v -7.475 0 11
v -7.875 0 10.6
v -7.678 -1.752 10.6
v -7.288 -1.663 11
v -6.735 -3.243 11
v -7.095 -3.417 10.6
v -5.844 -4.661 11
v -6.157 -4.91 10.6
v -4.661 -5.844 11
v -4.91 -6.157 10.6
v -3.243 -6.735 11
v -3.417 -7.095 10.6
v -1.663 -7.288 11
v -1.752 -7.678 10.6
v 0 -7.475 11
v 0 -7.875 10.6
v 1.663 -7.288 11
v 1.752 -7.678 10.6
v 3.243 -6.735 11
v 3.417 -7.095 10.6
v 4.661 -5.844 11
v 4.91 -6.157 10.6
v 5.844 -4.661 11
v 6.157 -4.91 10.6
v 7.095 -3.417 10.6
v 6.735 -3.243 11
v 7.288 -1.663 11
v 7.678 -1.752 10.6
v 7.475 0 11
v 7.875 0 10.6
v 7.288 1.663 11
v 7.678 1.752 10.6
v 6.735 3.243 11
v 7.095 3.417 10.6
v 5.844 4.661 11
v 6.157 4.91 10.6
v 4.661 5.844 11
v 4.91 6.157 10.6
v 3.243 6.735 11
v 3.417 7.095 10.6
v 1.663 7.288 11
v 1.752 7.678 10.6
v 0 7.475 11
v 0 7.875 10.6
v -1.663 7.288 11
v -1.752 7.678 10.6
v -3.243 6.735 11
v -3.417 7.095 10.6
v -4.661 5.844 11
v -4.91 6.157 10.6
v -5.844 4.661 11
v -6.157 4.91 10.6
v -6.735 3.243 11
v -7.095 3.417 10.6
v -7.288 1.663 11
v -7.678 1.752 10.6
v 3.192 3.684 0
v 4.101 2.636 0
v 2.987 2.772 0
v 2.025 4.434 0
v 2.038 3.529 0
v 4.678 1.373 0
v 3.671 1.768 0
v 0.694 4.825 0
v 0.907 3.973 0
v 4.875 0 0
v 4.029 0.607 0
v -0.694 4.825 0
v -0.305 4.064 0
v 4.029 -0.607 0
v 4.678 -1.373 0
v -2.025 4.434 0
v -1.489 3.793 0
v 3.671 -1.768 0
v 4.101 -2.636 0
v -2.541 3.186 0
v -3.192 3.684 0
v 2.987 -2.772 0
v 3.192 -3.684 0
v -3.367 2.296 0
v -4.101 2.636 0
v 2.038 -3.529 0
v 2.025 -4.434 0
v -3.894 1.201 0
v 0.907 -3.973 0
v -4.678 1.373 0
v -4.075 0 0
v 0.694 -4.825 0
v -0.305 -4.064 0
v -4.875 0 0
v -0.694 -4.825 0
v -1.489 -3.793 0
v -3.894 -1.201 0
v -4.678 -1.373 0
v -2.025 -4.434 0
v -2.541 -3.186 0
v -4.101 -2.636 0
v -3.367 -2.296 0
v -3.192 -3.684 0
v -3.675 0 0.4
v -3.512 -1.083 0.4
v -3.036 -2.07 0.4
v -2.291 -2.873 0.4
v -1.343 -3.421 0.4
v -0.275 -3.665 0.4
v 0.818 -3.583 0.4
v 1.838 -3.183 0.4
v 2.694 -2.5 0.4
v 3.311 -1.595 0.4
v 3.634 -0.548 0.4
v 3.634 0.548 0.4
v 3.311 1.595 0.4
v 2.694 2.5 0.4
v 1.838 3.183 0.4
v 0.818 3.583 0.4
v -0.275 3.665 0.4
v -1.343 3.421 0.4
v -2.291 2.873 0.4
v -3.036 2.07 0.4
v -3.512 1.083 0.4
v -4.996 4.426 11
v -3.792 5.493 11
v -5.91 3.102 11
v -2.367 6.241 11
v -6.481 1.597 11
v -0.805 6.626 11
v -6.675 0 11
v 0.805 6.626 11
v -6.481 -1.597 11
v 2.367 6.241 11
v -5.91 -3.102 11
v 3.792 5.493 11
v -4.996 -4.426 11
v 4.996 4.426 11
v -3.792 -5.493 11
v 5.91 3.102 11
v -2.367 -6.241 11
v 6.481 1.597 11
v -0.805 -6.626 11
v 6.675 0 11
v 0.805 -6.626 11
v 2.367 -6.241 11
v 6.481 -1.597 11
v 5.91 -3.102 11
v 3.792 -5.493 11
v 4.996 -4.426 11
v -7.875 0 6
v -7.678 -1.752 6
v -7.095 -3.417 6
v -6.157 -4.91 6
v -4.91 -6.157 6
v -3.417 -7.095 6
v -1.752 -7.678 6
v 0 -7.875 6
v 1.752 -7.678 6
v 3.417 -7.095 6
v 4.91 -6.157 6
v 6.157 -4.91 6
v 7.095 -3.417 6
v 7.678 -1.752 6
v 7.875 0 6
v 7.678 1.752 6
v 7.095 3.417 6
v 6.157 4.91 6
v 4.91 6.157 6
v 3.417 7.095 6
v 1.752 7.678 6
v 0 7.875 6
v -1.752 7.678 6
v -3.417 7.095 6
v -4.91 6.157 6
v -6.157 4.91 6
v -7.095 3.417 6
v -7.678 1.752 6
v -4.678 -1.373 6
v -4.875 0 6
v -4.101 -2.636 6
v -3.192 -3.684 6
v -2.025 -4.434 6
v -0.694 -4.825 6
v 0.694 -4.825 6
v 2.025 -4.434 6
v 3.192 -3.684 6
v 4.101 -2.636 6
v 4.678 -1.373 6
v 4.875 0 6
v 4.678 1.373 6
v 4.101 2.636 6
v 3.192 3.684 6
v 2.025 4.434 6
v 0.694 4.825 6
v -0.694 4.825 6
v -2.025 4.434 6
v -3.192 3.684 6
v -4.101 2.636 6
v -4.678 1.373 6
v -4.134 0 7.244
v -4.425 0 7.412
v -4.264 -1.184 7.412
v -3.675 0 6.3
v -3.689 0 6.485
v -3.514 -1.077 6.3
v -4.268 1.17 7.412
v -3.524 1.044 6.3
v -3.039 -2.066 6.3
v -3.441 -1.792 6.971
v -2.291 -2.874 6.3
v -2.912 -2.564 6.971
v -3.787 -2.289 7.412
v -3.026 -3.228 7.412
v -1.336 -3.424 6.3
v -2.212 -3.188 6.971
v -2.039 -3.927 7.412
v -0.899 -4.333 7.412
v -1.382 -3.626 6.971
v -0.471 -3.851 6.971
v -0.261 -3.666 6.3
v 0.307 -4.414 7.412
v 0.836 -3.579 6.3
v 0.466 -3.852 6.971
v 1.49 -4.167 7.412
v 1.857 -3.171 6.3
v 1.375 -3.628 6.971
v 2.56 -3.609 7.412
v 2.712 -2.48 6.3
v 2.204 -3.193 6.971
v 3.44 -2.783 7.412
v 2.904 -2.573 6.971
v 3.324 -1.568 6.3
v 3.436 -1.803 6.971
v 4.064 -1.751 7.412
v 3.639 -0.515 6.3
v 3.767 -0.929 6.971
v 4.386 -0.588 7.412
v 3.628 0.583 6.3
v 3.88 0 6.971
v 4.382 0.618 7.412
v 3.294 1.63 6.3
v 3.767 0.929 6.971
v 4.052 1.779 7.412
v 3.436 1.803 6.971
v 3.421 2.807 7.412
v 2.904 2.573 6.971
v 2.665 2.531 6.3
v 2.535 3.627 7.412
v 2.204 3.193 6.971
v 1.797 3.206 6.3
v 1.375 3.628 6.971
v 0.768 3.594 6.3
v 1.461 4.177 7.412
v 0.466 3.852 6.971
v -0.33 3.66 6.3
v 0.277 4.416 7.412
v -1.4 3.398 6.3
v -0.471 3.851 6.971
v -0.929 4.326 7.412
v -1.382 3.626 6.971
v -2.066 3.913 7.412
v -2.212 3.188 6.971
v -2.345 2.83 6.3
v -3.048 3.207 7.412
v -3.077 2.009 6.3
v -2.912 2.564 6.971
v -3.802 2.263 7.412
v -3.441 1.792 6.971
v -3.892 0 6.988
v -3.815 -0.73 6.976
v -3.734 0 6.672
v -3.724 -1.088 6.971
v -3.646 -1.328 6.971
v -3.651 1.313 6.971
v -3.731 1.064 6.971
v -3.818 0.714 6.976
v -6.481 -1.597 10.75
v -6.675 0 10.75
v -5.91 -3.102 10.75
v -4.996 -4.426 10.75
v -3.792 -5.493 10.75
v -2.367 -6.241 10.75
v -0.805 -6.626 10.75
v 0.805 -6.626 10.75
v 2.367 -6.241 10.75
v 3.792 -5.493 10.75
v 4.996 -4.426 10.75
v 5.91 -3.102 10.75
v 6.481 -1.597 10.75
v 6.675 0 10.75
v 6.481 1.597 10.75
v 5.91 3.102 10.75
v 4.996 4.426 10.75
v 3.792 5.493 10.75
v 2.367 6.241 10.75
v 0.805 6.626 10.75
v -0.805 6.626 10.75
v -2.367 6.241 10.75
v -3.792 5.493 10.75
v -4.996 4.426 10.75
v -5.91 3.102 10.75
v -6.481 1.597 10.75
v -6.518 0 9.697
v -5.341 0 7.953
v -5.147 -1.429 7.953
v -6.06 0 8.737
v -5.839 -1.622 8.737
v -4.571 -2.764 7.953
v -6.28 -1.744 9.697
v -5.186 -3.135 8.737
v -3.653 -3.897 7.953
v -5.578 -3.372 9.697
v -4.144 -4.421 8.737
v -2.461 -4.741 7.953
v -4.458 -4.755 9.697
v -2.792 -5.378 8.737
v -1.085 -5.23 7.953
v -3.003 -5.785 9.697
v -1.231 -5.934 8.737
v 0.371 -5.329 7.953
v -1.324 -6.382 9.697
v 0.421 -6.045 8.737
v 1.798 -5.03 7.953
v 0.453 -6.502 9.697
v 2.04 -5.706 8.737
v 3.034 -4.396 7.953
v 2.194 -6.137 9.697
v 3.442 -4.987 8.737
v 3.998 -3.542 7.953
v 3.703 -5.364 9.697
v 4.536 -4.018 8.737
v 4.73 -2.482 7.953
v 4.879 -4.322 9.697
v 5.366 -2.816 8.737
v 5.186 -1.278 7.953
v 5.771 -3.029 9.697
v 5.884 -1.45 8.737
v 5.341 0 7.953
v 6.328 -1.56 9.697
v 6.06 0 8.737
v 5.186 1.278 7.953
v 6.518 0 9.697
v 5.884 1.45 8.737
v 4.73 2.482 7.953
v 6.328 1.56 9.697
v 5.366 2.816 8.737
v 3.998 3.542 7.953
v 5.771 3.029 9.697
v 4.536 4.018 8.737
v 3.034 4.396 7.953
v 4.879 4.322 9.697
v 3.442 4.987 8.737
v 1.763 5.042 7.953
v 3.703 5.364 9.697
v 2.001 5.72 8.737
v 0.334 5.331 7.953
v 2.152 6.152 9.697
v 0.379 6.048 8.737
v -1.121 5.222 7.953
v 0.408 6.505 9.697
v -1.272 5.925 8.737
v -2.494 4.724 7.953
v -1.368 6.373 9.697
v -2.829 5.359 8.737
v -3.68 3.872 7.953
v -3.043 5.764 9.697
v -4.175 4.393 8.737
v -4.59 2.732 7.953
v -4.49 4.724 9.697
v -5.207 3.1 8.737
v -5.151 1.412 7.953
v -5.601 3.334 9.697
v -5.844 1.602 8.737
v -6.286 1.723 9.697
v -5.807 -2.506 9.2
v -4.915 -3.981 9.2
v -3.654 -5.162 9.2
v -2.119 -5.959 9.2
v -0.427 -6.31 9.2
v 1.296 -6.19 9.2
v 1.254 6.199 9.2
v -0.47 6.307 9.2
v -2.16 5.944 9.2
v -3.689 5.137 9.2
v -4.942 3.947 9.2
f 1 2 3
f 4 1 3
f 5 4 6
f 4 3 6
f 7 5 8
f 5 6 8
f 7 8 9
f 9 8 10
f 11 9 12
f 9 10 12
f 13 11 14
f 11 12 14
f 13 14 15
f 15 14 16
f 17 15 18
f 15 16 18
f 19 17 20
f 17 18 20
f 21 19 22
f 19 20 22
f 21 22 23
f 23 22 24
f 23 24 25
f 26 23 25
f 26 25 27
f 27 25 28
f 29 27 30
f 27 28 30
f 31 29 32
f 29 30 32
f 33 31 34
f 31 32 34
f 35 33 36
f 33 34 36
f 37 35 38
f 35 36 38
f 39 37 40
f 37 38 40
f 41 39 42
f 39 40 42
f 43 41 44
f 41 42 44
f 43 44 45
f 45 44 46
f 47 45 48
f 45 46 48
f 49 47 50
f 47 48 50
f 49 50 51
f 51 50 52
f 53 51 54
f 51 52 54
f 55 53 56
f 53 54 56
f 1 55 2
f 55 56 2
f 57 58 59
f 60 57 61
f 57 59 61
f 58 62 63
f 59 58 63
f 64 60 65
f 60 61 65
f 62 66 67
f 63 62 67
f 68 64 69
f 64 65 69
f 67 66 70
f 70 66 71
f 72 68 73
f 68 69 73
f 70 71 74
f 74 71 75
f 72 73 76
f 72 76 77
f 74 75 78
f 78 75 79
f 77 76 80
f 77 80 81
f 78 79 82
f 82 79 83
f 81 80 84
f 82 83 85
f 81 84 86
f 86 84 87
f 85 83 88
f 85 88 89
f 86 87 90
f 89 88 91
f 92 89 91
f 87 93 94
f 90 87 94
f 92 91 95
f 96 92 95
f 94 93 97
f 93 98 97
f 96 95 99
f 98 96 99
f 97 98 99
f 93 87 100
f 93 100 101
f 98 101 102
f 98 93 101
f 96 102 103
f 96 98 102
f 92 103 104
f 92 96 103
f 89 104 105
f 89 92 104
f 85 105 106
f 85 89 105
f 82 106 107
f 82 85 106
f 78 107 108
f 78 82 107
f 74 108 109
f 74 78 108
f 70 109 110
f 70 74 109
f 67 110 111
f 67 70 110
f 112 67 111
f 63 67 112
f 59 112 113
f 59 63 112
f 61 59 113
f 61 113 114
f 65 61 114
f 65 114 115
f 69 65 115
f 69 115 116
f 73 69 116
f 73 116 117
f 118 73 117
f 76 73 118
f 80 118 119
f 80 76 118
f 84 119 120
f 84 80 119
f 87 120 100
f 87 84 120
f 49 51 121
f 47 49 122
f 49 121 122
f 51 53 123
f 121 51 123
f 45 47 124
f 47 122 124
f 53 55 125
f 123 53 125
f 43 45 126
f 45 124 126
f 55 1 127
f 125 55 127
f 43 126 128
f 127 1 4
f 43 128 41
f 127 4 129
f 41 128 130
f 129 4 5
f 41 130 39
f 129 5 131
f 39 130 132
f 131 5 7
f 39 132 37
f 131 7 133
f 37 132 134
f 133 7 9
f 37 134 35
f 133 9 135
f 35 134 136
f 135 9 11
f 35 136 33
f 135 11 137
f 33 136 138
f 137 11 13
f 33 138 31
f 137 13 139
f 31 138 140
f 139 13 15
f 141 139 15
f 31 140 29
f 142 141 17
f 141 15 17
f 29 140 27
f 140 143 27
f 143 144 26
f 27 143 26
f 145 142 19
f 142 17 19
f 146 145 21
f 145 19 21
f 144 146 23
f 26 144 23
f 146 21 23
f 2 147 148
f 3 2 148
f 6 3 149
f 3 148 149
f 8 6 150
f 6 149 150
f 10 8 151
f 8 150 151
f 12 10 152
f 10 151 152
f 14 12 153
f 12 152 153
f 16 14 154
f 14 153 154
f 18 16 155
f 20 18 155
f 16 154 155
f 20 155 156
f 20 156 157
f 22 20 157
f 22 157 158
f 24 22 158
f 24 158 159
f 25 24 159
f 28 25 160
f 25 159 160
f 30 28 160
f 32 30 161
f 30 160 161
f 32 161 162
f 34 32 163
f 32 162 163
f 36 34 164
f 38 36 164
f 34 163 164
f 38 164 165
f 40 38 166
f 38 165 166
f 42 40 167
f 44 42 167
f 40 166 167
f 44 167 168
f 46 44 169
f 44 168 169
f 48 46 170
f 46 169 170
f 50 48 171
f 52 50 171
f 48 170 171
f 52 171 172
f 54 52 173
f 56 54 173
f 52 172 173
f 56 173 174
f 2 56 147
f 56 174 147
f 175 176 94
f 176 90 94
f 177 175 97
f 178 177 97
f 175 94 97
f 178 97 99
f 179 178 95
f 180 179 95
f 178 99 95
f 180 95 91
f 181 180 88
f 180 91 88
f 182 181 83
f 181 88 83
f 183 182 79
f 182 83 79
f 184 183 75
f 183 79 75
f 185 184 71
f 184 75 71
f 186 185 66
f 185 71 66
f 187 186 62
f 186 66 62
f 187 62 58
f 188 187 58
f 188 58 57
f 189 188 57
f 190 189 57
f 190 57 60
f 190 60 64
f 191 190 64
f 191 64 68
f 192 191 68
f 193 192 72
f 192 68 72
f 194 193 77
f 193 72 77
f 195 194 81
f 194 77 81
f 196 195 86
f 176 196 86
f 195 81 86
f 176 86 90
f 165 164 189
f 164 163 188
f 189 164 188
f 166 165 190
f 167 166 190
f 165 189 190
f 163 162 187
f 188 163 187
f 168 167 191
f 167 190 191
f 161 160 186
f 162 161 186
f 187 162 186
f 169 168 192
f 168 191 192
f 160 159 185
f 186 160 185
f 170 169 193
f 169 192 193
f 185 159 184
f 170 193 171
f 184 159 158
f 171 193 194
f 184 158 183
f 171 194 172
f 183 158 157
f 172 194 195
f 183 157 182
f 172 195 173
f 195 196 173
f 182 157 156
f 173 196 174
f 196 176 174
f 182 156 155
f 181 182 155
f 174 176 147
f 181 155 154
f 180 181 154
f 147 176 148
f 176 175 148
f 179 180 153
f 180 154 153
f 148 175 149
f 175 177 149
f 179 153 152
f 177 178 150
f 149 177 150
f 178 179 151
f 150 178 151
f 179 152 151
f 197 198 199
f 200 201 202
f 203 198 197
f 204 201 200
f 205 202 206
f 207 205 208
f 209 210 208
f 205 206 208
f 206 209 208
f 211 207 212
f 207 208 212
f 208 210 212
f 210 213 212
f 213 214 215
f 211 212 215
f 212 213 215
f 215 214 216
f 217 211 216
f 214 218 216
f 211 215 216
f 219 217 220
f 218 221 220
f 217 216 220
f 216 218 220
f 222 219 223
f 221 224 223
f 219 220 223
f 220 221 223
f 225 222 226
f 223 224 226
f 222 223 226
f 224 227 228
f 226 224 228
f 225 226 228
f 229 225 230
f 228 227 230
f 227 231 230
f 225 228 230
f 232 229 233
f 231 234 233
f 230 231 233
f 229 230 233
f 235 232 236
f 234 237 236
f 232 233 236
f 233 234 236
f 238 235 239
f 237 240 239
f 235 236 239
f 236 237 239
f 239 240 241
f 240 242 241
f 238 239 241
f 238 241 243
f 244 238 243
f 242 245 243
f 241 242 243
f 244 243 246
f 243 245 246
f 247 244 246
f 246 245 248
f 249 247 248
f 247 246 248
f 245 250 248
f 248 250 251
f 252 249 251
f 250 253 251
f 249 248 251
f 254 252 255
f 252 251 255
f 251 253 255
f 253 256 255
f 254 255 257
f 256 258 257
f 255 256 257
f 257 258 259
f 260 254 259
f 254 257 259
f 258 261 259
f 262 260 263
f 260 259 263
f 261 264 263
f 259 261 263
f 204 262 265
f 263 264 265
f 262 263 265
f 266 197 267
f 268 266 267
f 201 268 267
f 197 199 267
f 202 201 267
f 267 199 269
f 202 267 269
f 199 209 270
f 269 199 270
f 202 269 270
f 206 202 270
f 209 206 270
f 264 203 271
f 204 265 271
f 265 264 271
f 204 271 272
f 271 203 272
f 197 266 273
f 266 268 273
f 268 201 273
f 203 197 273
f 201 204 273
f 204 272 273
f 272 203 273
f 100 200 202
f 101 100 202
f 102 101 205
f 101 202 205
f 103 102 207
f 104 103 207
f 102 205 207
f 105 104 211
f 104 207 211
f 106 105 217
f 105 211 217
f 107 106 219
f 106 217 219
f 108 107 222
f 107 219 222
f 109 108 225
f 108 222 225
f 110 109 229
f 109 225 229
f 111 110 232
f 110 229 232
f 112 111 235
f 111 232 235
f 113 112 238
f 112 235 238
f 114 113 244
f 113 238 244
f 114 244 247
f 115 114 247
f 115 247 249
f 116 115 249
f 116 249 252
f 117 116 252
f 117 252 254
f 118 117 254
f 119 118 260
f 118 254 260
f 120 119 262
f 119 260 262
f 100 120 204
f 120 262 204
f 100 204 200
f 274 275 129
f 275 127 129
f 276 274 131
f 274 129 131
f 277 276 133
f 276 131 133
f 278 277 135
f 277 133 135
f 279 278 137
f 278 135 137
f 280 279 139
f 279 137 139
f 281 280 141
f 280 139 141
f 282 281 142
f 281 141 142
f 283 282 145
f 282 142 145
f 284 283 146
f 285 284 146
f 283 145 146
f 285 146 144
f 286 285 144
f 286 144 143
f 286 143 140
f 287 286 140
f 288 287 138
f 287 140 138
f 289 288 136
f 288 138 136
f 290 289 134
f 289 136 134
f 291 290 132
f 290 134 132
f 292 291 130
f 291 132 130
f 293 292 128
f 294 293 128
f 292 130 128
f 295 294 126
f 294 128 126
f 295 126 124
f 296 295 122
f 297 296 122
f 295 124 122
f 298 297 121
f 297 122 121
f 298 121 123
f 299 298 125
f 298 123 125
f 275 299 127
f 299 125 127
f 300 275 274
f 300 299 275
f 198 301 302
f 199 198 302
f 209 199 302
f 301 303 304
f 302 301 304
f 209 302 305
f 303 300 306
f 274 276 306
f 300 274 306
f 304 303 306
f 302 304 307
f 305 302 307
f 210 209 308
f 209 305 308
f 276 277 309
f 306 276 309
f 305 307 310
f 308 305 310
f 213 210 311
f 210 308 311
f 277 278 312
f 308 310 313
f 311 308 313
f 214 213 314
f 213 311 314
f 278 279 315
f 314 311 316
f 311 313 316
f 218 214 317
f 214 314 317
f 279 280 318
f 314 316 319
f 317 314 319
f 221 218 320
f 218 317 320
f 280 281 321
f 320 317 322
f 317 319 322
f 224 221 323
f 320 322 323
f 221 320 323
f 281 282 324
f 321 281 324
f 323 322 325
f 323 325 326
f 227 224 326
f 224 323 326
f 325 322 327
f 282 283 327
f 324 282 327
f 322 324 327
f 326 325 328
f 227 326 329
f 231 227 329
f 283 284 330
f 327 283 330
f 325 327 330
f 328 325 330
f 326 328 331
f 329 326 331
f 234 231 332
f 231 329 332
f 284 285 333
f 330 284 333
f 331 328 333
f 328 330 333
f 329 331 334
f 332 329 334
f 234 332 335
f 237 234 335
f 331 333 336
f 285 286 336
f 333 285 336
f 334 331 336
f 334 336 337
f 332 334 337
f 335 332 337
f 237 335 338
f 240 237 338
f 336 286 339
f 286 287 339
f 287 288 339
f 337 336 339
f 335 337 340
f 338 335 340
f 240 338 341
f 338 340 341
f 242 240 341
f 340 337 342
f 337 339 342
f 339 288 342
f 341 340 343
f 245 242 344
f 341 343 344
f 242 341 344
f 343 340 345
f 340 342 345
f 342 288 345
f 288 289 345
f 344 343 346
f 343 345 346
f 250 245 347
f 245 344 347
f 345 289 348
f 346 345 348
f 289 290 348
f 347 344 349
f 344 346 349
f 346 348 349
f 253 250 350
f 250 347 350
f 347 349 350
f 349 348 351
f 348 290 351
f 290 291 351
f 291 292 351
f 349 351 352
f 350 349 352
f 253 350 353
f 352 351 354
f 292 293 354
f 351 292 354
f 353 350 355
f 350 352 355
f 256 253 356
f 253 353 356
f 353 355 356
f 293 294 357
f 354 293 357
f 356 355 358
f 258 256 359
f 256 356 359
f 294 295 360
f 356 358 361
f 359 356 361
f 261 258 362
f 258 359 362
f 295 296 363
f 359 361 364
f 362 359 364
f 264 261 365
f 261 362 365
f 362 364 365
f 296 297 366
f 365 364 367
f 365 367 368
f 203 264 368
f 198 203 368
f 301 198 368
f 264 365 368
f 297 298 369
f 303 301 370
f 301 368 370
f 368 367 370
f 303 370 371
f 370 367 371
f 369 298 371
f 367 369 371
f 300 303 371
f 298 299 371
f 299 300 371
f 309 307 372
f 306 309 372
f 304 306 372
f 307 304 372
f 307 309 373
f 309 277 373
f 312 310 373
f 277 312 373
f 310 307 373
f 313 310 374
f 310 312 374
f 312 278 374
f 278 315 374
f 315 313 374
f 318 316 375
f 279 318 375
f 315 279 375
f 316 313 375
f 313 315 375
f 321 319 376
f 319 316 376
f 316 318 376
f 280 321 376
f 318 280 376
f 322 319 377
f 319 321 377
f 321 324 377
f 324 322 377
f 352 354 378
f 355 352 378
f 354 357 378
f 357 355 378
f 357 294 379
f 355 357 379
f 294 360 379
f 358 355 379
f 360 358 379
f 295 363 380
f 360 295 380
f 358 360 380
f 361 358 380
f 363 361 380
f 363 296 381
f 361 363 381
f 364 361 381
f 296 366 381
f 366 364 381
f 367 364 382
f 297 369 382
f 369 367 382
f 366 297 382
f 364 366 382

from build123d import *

# Parameters (mm, degrees)
F3_R    = 1.2
F4_SIZE = 0.4


# Not quite as in the source:
# - a fillet or chamfer that OpenCascade refuses, or shapes differently, is made with other operations: its cross-section is extruded or revolved along the edge and cut away or added


with BuildPart() as f1:
    # F0 (on Front) → F1 (revolve)
    with BuildSketch(Plane.XZ):
        Polygon((-4.875, 6), (-4.875, 0), (-3.675, 0), (-3.675, 7.2), (-6.675, 7.2), (-6.675, 11), (-7.875, 11), (-7.875, 6), align=None)
    revolve(axis=Axis((0, 0, 5.5), (0, 0, 1)))

    # F2: fillet of radius 3.6 on 1 edges, made by hand

    # F2_s1 → F2_t2 (revolve)
    with BuildSketch(Plane.XZ):
        with BuildLine():
            ThreePointArc((-3.675, 7.2), (-5.824545417, 8.4258578621), (-6.675, 10.7496478699))
            Line((-6.675, 10.7496478699), (-6.675, 7.2))
            Line((-6.675, 7.2), (-3.675, 7.2))
        make_face()
    revolve(axis=Axis((0, 0, 7.2), (0, 0, 1)))

    # F3
    f3_edges = [f1.edges().sort_by_distance(p)[0] for p in [
        (3.675, 0, 7.2),
    ]]
    fillet(f3_edges, radius=F3_R)

    # F4
    f4_edges = [f1.edges().sort_by_distance(p)[0] for p in [
        (7.875, 0, 11),
        (3.675, 0, 0),
    ]]
    chamfer(f4_edges, length=F4_SIZE)


solid = f1.part
